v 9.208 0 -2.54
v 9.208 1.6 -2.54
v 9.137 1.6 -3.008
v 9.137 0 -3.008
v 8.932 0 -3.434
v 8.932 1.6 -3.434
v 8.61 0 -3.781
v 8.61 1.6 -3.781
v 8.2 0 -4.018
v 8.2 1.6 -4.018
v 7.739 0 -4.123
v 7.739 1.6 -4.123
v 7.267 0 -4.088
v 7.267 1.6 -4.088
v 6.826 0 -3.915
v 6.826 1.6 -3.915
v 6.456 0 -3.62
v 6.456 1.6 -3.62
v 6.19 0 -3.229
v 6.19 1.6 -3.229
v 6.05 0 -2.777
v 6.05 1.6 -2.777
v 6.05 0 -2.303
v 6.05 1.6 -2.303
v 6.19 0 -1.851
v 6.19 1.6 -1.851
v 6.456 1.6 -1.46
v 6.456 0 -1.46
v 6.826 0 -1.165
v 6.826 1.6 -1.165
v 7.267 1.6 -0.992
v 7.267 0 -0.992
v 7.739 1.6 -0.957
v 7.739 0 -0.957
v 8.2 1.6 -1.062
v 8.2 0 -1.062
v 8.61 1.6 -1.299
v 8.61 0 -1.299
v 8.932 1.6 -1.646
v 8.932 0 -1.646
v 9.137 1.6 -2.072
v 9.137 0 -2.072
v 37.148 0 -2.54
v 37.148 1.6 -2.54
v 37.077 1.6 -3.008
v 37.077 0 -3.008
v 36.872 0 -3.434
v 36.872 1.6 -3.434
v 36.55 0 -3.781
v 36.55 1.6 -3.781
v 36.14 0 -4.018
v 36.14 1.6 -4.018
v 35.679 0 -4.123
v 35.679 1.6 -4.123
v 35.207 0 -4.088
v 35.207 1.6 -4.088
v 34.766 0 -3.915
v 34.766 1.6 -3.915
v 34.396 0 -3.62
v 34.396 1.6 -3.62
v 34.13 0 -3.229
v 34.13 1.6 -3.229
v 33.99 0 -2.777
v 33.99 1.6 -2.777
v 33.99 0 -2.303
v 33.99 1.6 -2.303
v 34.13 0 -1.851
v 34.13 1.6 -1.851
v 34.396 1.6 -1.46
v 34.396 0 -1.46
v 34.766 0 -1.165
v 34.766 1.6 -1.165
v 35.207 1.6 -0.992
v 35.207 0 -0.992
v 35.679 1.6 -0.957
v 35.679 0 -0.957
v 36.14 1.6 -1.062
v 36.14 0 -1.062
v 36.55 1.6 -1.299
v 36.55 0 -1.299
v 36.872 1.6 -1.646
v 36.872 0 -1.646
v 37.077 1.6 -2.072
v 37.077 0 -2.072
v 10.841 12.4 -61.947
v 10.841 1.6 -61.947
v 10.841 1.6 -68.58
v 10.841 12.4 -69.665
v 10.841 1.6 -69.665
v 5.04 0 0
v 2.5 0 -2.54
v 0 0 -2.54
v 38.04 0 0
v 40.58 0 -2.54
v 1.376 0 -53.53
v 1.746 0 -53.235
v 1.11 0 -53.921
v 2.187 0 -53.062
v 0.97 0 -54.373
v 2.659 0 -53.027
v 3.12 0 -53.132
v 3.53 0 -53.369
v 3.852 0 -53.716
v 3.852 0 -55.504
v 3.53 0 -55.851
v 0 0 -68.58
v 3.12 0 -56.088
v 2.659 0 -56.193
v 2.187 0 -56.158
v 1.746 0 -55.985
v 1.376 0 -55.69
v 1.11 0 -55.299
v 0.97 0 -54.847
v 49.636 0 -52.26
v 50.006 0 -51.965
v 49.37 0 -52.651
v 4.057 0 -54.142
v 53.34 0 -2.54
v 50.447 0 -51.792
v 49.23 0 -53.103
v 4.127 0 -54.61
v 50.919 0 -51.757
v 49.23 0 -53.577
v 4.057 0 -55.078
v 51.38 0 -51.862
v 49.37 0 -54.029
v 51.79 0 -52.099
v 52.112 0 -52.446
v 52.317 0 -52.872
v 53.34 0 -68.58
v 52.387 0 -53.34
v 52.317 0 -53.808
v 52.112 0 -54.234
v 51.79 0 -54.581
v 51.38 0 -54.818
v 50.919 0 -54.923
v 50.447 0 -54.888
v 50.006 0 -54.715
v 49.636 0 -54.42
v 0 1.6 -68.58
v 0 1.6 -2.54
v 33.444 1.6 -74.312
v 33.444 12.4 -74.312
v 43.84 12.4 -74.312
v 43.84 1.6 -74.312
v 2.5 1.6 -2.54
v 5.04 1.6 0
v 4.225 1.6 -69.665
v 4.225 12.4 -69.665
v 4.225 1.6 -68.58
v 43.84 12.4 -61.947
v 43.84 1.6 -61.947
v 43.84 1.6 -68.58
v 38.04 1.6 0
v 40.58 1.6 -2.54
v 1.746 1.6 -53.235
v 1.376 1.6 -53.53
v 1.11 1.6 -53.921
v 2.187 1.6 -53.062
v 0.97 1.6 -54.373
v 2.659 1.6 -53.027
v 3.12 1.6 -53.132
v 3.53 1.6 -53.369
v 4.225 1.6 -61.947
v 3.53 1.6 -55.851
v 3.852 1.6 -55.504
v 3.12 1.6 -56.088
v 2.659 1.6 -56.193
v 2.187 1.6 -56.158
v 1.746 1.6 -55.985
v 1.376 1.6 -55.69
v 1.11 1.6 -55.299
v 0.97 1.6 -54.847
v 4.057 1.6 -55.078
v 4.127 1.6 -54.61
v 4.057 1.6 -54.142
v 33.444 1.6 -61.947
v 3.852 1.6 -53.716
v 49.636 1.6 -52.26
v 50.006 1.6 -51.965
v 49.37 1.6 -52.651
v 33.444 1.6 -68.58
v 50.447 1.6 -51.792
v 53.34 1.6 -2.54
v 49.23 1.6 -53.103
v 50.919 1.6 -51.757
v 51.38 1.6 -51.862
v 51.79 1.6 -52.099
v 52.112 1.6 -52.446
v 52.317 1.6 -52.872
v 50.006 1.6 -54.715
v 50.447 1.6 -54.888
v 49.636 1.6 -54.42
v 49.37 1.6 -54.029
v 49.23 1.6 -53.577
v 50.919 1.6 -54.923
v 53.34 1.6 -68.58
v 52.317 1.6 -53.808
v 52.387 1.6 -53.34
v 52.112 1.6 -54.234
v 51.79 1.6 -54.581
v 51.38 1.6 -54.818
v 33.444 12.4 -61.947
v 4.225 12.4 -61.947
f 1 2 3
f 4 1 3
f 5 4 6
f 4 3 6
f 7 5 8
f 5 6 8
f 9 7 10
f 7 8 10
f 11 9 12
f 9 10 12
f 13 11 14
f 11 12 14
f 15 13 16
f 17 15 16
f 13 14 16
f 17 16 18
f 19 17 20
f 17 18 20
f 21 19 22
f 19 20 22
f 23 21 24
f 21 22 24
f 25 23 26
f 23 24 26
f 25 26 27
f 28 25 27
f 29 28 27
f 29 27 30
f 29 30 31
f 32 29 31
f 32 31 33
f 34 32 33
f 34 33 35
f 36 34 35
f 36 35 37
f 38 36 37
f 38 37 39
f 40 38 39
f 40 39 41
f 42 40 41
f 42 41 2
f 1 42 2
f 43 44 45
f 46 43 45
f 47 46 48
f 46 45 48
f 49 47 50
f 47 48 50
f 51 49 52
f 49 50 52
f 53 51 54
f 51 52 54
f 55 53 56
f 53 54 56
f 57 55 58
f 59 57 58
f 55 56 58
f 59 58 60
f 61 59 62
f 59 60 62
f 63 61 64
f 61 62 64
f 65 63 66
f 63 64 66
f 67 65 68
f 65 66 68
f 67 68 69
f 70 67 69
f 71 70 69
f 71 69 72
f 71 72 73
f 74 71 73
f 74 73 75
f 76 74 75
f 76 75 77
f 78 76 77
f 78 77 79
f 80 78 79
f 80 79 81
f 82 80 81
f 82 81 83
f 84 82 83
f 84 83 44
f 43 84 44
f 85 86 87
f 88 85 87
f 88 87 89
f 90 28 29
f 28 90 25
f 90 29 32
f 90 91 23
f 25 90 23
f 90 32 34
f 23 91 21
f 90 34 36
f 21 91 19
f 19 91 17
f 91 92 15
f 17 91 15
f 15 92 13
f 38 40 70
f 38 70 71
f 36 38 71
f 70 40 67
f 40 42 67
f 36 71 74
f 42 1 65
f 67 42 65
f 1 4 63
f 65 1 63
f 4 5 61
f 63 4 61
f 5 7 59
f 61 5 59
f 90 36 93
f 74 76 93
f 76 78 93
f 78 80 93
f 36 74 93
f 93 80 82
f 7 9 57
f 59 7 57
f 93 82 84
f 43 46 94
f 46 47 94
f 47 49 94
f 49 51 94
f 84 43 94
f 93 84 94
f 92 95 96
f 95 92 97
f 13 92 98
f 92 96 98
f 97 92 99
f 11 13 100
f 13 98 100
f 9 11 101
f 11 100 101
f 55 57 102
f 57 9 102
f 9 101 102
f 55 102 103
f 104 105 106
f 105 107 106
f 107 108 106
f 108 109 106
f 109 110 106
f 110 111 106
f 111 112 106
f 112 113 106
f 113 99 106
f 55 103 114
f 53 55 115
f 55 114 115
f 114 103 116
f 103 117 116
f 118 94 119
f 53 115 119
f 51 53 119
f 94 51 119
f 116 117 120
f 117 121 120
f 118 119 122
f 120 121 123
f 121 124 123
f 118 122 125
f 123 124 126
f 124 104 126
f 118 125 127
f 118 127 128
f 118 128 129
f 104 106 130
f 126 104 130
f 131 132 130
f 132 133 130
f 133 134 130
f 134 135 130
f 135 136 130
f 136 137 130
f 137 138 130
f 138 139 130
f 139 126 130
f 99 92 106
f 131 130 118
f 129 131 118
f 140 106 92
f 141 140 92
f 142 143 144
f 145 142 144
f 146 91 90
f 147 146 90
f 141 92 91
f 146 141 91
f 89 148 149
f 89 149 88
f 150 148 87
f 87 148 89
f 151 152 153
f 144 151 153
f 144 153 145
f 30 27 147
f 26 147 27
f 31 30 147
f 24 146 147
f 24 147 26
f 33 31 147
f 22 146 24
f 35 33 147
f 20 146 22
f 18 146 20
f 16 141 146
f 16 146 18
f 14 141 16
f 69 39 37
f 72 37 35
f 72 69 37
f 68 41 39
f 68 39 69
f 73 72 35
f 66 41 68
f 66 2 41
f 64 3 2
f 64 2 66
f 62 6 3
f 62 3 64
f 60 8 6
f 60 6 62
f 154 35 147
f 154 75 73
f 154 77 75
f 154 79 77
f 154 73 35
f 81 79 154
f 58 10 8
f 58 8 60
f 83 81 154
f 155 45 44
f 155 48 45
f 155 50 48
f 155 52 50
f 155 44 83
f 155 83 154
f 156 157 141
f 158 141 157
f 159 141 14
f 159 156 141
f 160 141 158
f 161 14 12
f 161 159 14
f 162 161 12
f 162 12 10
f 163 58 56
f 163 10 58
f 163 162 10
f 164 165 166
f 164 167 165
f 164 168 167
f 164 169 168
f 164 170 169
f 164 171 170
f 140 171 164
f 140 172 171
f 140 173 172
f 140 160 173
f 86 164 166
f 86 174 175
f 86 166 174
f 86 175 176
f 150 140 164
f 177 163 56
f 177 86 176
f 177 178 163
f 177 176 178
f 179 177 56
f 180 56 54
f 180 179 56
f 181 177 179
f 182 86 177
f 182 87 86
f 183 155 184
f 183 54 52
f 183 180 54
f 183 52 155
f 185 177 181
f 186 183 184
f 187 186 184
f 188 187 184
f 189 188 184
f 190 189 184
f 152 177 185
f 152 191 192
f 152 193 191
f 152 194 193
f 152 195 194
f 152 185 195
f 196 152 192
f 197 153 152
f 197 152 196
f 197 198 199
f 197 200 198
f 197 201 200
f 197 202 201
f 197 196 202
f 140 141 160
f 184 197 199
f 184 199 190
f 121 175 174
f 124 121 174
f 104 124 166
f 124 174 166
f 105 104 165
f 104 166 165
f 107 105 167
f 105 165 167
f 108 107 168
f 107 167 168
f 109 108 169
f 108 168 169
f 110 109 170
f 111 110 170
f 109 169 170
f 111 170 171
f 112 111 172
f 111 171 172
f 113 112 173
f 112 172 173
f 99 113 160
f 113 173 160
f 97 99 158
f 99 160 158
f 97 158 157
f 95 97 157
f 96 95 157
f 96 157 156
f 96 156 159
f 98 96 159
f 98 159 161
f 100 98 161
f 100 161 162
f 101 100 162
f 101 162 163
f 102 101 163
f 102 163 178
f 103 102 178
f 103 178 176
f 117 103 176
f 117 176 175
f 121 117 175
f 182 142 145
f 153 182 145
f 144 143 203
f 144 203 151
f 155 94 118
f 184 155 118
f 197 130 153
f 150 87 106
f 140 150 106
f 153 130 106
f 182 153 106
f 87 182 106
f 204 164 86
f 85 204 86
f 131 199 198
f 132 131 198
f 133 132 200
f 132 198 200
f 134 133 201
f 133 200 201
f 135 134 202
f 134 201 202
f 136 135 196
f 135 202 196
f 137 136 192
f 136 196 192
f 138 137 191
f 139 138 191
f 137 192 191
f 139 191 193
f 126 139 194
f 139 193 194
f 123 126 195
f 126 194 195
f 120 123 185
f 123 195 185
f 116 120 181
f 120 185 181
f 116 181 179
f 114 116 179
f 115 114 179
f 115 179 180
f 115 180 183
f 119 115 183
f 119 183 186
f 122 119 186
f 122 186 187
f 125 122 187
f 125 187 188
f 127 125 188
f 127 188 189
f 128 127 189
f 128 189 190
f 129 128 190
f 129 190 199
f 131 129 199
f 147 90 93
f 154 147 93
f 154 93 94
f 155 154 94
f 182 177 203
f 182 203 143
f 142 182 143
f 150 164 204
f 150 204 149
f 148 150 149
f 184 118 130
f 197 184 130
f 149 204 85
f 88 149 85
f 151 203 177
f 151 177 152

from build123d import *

# Parameters (mm, degrees)
BOSS_EXTRUDE1_DEPTH = 1.6
SKETCH2_W           = 6.615656004
SKETCH2_H           = 7.718265338
SKETCH2_W_2         = 10.396030864
SKETCH2_H_2         = 12.364976103
BOSS_EXTRUDE2_DEPTH = 10.8
SKETCH3_R           = 1.5875
CUT_EXTRUDE1_DEPTH  = 2.6


with BuildPart() as part:
    # Sketch1 → Boss-Extrude1 (new body)
    with BuildSketch(Plane(origin=(0, 0, 0), x_dir=(1, 0, 0), z_dir=(0, 1, 0))):
        Polygon((0, 68.58), (0, 2.54), (2.5, 2.54), (5.04, 0), (38.04, 0), (40.58, 2.54), (53.34, 2.54), (53.34, 68.58), align=None)
    extrude(amount=BOSS_EXTRUDE1_DEPTH)

    # Sketch2 → Boss-Extrude2 (add)
    with BuildSketch(Plane(origin=(0, 1.6, 0), x_dir=(1, 0, 0), z_dir=(0, 1, 0))):
        with Locations((7.533094465, 65.806229304)):
            Rectangle(SKETCH2_W, SKETCH2_H)
        with Locations((38.642429245, 68.129584686)):
            Rectangle(SKETCH2_W_2, SKETCH2_H_2)
    extrude(amount=BOSS_EXTRUDE2_DEPTH)

    # Sketch3 → Cut-Extrude1 (cut, through all)
    with BuildSketch(Plane(origin=(0, 1.6, 0), x_dir=(1, 0, 0), z_dir=(0, 1, 0))):
        with Locations((7.62, 2.54)):
            Circle(SKETCH3_R)
        with Locations((35.56, 2.54)):
            Circle(SKETCH3_R)
        with Locations((50.8, 53.34)):
            Circle(SKETCH3_R)
        with Locations((2.54, 54.61)):
            Circle(SKETCH3_R)
    extrude(amount=-CUT_EXTRUDE1_DEPTH, mode=Mode.SUBTRACT)


solid = part.part
